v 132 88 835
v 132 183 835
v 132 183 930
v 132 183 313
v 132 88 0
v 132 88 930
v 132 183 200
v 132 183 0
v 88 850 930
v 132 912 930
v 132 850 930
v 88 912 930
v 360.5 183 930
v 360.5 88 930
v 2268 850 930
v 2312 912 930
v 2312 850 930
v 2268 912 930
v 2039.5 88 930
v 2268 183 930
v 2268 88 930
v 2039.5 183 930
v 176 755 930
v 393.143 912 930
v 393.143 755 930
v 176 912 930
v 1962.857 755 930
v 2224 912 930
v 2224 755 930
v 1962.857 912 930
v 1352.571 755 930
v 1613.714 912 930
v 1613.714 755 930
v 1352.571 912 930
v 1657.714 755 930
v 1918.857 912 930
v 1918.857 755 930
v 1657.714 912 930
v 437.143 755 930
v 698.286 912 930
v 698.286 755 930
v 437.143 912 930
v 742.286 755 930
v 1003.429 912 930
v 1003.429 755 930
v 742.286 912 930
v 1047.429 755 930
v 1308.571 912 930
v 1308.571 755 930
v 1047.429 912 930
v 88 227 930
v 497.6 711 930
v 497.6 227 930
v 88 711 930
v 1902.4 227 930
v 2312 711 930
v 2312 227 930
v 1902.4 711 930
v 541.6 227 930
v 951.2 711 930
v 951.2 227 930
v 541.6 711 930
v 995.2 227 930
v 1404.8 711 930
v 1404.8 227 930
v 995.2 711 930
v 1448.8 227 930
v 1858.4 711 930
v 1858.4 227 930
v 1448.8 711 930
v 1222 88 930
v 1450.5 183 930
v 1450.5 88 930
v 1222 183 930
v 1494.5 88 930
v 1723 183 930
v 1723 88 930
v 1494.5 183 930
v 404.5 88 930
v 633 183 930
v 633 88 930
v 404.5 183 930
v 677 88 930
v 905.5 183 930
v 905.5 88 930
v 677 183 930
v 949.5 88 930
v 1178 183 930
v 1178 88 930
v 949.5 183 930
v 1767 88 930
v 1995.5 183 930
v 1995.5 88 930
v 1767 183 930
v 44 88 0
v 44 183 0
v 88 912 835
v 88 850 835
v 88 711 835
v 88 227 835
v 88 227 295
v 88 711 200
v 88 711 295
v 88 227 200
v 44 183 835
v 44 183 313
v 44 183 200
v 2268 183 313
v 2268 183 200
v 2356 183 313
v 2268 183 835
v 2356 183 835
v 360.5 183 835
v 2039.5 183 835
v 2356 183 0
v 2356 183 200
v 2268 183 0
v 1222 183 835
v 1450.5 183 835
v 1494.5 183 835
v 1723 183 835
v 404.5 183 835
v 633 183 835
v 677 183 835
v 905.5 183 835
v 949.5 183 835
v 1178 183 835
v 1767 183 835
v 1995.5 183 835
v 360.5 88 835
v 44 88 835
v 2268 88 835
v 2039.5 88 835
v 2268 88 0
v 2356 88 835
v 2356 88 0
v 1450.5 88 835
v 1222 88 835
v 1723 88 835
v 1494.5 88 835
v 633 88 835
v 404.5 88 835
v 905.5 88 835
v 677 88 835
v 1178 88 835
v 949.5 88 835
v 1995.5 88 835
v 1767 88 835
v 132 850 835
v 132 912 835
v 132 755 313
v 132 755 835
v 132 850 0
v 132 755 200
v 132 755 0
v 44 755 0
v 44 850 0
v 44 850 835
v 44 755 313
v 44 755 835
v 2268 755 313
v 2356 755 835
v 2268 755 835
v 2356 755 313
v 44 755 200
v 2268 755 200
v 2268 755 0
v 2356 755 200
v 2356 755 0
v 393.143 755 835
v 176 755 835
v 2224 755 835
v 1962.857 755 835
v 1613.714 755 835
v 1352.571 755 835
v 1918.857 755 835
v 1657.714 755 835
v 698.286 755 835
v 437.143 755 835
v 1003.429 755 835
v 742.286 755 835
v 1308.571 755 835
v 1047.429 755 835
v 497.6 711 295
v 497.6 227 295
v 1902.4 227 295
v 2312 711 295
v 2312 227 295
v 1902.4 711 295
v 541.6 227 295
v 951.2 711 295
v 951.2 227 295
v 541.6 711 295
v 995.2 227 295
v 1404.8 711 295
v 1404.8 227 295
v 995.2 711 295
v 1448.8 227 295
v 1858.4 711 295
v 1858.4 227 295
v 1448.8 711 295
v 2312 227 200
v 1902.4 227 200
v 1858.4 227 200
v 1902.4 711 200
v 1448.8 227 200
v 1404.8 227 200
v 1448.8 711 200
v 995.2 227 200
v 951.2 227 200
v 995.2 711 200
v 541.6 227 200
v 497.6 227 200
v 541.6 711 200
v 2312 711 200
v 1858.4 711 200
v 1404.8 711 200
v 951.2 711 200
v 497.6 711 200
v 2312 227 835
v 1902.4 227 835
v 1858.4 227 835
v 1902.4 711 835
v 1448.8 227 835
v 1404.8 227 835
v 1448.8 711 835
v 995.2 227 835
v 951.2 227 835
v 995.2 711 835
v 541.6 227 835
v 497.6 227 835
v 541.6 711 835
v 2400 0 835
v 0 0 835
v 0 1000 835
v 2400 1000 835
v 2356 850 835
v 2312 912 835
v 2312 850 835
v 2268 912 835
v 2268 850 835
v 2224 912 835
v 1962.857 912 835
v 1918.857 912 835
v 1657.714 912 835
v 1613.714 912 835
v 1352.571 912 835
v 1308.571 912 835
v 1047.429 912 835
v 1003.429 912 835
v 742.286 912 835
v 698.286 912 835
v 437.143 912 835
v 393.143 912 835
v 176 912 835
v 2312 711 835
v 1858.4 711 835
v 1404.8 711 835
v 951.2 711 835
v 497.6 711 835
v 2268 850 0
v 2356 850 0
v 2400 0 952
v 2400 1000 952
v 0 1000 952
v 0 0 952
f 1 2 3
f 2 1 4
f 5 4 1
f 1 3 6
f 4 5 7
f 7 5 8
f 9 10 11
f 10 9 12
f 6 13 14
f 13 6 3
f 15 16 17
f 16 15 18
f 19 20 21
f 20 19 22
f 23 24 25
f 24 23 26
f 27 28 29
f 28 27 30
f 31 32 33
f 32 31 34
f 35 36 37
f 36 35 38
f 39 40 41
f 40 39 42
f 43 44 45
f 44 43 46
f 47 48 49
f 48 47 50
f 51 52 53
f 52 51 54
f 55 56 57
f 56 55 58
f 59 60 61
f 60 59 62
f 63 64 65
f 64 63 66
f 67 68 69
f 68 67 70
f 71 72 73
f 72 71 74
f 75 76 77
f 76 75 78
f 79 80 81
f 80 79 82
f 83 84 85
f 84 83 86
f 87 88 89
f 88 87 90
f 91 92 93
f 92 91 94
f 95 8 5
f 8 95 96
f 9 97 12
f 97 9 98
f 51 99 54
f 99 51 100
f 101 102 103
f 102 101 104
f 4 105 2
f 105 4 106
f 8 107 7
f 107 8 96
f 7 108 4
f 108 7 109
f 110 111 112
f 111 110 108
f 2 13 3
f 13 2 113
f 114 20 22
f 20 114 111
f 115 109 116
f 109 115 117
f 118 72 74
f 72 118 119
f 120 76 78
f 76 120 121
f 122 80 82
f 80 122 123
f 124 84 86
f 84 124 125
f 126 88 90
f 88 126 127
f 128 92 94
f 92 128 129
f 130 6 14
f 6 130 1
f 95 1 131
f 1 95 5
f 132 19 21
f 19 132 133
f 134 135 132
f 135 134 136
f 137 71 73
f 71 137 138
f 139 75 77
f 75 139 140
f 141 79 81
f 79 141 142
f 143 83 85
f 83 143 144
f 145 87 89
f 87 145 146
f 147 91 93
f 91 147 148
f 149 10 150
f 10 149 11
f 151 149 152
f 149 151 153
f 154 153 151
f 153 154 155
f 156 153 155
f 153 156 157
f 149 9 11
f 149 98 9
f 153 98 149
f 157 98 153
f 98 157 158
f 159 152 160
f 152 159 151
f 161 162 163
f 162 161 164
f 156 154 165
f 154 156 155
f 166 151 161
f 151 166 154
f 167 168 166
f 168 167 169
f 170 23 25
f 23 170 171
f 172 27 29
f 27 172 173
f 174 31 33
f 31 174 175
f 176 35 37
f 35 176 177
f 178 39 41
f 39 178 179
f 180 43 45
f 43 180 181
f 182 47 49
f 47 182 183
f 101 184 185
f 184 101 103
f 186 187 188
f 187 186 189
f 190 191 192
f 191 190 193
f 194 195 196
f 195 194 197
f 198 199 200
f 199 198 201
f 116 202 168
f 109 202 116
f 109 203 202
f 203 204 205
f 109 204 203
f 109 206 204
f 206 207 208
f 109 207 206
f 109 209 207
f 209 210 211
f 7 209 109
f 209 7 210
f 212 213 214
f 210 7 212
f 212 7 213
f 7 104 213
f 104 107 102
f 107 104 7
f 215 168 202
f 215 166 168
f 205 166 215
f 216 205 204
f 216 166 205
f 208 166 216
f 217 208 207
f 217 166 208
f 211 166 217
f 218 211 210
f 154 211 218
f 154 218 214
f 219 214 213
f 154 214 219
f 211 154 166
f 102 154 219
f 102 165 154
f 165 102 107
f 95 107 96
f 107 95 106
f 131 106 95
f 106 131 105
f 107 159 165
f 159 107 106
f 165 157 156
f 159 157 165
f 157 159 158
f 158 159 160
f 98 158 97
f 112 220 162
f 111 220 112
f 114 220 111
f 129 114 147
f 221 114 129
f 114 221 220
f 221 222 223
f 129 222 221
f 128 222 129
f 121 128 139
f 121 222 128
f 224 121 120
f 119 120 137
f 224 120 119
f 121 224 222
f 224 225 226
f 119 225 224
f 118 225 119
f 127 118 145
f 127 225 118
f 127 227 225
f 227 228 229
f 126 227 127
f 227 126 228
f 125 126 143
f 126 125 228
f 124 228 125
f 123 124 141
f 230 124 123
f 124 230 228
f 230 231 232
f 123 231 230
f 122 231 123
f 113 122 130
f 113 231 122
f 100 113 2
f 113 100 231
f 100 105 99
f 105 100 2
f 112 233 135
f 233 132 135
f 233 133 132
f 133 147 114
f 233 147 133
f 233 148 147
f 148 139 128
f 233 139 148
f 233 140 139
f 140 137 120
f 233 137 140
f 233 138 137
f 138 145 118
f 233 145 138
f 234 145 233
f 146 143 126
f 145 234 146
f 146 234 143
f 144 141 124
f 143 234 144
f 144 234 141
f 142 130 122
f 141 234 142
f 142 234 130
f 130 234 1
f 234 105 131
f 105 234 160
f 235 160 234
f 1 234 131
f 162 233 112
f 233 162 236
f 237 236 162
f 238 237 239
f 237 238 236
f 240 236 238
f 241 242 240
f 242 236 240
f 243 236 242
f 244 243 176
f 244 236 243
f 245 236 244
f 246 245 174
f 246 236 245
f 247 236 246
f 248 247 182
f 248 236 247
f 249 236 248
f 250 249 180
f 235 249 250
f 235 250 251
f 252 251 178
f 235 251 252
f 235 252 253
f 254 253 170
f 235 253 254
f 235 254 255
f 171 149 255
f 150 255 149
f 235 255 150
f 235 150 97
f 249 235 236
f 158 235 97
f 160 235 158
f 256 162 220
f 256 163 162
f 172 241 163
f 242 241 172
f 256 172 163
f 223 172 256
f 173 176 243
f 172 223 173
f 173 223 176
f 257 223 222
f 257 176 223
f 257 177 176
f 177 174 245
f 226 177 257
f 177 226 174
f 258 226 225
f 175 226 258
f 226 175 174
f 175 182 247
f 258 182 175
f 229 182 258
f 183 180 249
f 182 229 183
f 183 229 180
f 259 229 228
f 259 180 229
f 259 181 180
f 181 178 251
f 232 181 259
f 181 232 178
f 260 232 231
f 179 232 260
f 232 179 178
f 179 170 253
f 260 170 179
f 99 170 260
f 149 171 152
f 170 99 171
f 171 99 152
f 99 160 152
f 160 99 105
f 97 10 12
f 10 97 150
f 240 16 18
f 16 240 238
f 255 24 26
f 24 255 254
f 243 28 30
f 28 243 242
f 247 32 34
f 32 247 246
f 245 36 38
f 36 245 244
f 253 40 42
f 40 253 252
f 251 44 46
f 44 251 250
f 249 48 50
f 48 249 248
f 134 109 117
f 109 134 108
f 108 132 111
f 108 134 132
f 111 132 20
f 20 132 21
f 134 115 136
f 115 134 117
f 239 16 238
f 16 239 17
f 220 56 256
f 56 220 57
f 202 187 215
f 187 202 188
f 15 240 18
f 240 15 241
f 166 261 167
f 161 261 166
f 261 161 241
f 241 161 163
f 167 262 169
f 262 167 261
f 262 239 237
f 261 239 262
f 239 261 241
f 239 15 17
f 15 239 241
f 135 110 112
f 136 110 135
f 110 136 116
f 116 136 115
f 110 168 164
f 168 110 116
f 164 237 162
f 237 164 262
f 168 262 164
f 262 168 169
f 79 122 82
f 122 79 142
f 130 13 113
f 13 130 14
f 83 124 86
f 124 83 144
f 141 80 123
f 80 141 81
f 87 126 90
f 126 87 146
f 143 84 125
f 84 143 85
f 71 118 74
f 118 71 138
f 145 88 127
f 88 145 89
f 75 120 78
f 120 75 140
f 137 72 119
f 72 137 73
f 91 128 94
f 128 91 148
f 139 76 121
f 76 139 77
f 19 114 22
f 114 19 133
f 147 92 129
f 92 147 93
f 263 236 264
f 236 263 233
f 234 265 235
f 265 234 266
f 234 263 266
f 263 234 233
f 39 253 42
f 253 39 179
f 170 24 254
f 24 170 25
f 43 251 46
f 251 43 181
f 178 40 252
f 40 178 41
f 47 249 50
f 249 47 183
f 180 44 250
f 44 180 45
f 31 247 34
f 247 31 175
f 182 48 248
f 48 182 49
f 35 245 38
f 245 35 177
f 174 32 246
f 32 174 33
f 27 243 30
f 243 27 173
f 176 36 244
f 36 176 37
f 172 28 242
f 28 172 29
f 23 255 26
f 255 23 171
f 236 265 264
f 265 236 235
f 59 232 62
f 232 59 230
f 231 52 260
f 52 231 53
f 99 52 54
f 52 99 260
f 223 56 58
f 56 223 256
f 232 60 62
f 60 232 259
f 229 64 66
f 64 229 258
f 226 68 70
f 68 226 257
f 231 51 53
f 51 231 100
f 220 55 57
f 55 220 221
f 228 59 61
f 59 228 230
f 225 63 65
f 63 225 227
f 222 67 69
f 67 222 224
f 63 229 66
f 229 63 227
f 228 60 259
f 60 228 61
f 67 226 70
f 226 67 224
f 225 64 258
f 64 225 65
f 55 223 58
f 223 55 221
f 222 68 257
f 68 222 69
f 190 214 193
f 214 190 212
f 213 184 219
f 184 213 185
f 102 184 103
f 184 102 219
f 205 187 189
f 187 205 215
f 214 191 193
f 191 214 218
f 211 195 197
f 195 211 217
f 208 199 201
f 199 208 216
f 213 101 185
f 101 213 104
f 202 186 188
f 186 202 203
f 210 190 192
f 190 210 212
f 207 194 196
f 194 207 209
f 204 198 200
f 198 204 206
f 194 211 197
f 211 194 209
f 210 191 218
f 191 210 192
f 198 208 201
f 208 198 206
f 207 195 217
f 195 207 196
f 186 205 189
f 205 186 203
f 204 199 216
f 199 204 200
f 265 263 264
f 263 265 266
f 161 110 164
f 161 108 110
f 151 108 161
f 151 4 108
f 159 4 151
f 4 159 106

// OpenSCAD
/* [Bench Dimensions] */
benchWidth=2400;
benchDepth=1000;
// Including worksheet surface
benchHeight=952;
// Height of the lower platform, measured from the bottom, including the platform surface
braceHeight=313;
// Depth of the lower platform
braceDepth=572;

/* [Material Dimensions] */
// Thickness of the sheet used for the worksheet surfacce
topThickness=22;
// Thickness of the sheet used for the platform surface
braceTopThickness=18;

// Width of the beams used
beamWidth=44;
// Height of the beams used
beamHeight=95;

/* [Overhangs] */
// Is a front overhang desired?
frontOverhang=1; // [0,1]       
// Specify the depth of the front overhang. Minimum is 2x beamWidth. Will be rounded up to 2x beamWidth if lower is specified
frontOverhangDepth=0; 

// Is a rear overhang desired?
rearOverhang=1; // [0,1]  
// Specify the depth of the rear overhang. Minimum is 2x beamWidth. Will be rounded up to 2x beamWidth if lower is specified
rearOverhangDepth=150;    

/* [Stud Spacing] */
// Maximum distance between the small studs below the worksheet surface
smallStudSpacing=300;
// Maximum distance between the large studs below the worksheet surface
largeStudSpacing=500;
// Maximum distance between the studs below the platform surface
braceStudSpacing=500;

/* [Hidden] */
frontOverhangDepthReal = max(2*beamWidth,frontOverhangDepth)*frontOverhang;
rearOverhangDepthReal = max(2*beamWidth,rearOverhangDepth)*rearOverhang;
    
frameHeight = benchHeight - topThickness;
frameDepth = benchDepth - rearOverhangDepthReal - frontOverhangDepthReal;

braceStartX = braceHeight - beamHeight - braceTopThickness;   

///// stud orientation
hx=1*1;	// horizontal x
hy=2*1;	// horizontal y
v=3*1;	// vertical
/////


module stud(length=0, orient=v){
    echo(length=length);
	if (orient==hy) {
		cube([beamWidth,length,beamHeight]);
	} else if (orient==hx) {
		cube([length,beamWidth,beamHeight]);
	} else {
		cube([beamWidth,beamHeight,length]);
	}		
}


module leg() {
    echo("LEG");
    translate([beamWidth,0,0]) stud(frameHeight);
    translate([beamWidth,frameDepth-beamHeight,0]) stud(frameHeight);
    
    translate([0,0,braceStartX]) stud(frameDepth,orient=hy);
    
    topBeamYposStart = frontOverhang==0 ? 
        0 : 
        0-frontOverhangDepthReal+2*beamWidth;
    topBeamYposEnd = frontOverhang==0 ? 
        frameDepth : 
        frameDepth+rearOverhangDepthReal-2*beamWidth;
    translate([0,topBeamYposStart,frameHeight-beamHeight]) 
        stud(topBeamYposEnd-topBeamYposStart,orient=hy);
    
    translate([0,0,0]) stud(braceStartX);
    translate([0,frameDepth-beamHeight,0]) stud(braceStartX);
    
    translate([0,0,braceStartX+beamHeight]) stud(frameHeight-braceStartX-2*beamHeight);
    translate([0,frameDepth-beamHeight,braceStartX+beamHeight]) stud(frameHeight-braceStartX-2*beamHeight);
}

module topFrameBraces(xposStart=0, xposEnd=0, yposStart=0, yposEnd=0, studSpacing=0, bracesAtStartAndEnd=0) {
    bracesAreaWidth = xposEnd - xposStart;    
    noOfBraces = ceil(bracesAreaWidth / studSpacing)-1;
    bracesSpacing = bracesAtStartAndEnd == 0 ? 
        (bracesAreaWidth - noOfBraces * beamWidth) / (noOfBraces+1) : 
        (bracesAreaWidth - noOfBraces * beamWidth) / noOfBraces;    
    
    for(brace = [1:noOfBraces])
    {
        translate([xposStart + brace*bracesSpacing +(brace-1)*beamWidth,yposStart,0]) 
            stud(yposEnd-yposStart, orient=hy);
    }
    
    if (bracesAtStartAndEnd == 1) {
        translate([xposStart,yposStart,0]) stud(yposEnd-yposStart, orient=hy);
        translate([xposEnd-beamWidth,yposStart,0]) stud(yposEnd-yposStart, orient=hy);
    }
}

module topFrame() {
    echo("TOPFRAME");
    
    framePositionZ = frameHeight-beamHeight;
    
    // Inner beams
    translate([2*beamWidth,frontOverhangDepthReal + beamHeight,framePositionZ]) 
        stud(benchWidth-4*beamWidth, orient=hx);
    translate([2*beamWidth,frameDepth + frontOverhangDepthReal - beamWidth - beamHeight,framePositionZ]) 
        stud(benchWidth-4*beamWidth, orient=hx);
    
    // Front beam and braces
    if (frontOverhang==0){
        translate([3*beamWidth,0,framePositionZ]) 
            stud(benchWidth-6*beamWidth, orient=hx);
        
        translate([0,0,framePositionZ]) topFrameBraces(
            xposStart=3*beamWidth,
            xposEnd=benchWidth-3*beamWidth,
            yposStart=1*beamWidth,
            yposEnd=1*beamHeight,   
            studSpacing=smallStudSpacing);

    } else if (frontOverhangDepthReal==2*beamWidth) {
        translate([1*beamWidth,1*beamWidth,framePositionZ]) 
            stud(benchWidth-2*beamWidth, orient=hx);
        
        translate([0,0,framePositionZ]) 
            stud(benchWidth, orient=hx);
        
        translate([0,0,framePositionZ]) topFrameBraces(
            xposStart=3*beamWidth,
            xposEnd=benchWidth-3*beamWidth,
            yposStart=2*beamWidth,
            yposEnd=2*beamWidth+1*beamHeight,   
            studSpacing=smallStudSpacing);
        
    } else {
        translate([1*beamWidth,1*beamWidth,framePositionZ]) 
            stud(benchWidth-2*beamWidth, orient=hx);
        
        translate([0,0,framePositionZ]) 
            stud(benchWidth, orient=hx);
        
        translate([0,0,framePositionZ]) topFrameBraces(
            xposStart=3*beamWidth,
            xposEnd=benchWidth-3*beamWidth,
            yposStart=2*beamWidth,
            yposEnd=frontOverhangDepthReal+beamHeight,   
            studSpacing=smallStudSpacing,
            bracesAtStartAndEnd=1);
    }
    
    // Rear beam and braces
    if (rearOverhang==0){
        translate([3*beamWidth,benchDepth-beamWidth,framePositionZ]) 
            stud(benchWidth-6*beamWidth, orient=hx);
        
        translate([0,0,framePositionZ]) topFrameBraces(
            xposStart=3*beamWidth,
            xposEnd=benchWidth-3*beamWidth,
            yposStart=benchDepth-beamHeight,
            yposEnd=benchDepth-beamWidth,
            studSpacing=smallStudSpacing);
        
    } else if (rearOverhangDepthReal==2*beamWidth) {
        translate([1*beamWidth,benchDepth-2*beamWidth,framePositionZ]) 
            stud(benchWidth-2*beamWidth, orient=hx);
        
        translate([0,benchDepth-beamWidth,framePositionZ]) 
            stud(benchWidth, orient=hx);
        
        translate([0,0,framePositionZ]) topFrameBraces(
            xposStart=3*beamWidth,
            xposEnd=benchWidth-3*beamWidth,
            yposStart=benchDepth-beamHeight-2*beamWidth,
            yposEnd=benchDepth-2*beamWidth,   
            studSpacing=smallStudSpacing);
        
    } else {
        translate([1*beamWidth,benchDepth-2*beamWidth,framePositionZ]) 
            stud(benchWidth-2*beamWidth, orient=hx);
        
        translate([0,benchDepth-beamWidth,framePositionZ]) 
            stud(benchWidth, orient=hx);
        
        translate([0,0,framePositionZ]) topFrameBraces(
            xposStart=3*beamWidth,
            xposEnd=benchWidth-3*beamWidth,
            yposStart=benchDepth-rearOverhangDepthReal-beamHeight,
            yposEnd=benchDepth-2*beamWidth,   
            studSpacing=smallStudSpacing,
            bracesAtStartAndEnd=1);
    }
    
    // Inner braces
    translate([0,0,framePositionZ]) topFrameBraces(
        xposStart=2*beamWidth, 
        xposEnd=benchWidth-2*beamWidth, 
        yposStart=frontOverhangDepthReal + beamHeight+beamWidth, 
        yposEnd=frameDepth + frontOverhangDepthReal - beamWidth - beamHeight,
        studSpacing=largeStudSpacing);
    
    // Side braces
    ystart = frontOverhang==0 ? 0 : beamWidth;
    yend   = rearOverhang ==0 ? benchDepth : benchDepth - beamWidth;
    translate([0,ystart,framePositionZ]) stud(yend-ystart, orient=hy);
    translate([benchWidth-beamWidth,ystart,framePositionZ]) stud(yend-ystart, orient=hy);
        
    
}

module braceFrame() {
    echo("BRACEFRAME");
    framePositionZ = braceStartX;
    yposRear = frameDepth-beamHeight+frontOverhangDepthReal-beamWidth;
    yposFront = yposRear - braceDepth + beamWidth;
    
    translate([2*beamWidth,yposFront,framePositionZ])
        stud(benchWidth-4*beamWidth, orient=hx);
    
    translate([2*beamWidth,yposRear,framePositionZ])
        stud(benchWidth-4*beamWidth, orient=hx);
    
    translate([0,0,framePositionZ]) topFrameBraces(
            xposStart=2*beamWidth,
            xposEnd=benchWidth-2*beamWidth,
            yposStart=yposFront+beamWidth,
            yposEnd=yposRear,   
            studSpacing=braceStudSpacing);
}

module topDeck() {
    translate([0,0,benchHeight-topThickness])
        cube([benchWidth, benchDepth, topThickness]);
    
}

module braceDeck() {
    yposRear = frameDepth-beamHeight+frontOverhangDepthReal;
    yposFront = yposRear - braceDepth;
    
    braceDeckWidth = benchWidth-2*beamWidth;
    braceDeckDepth = yposRear-yposFront;
    
    echo(braceDeckWidth=braceDeckWidth);  
    echo(braceDeckDepth=braceDeckDepth);  
    
    translate([beamWidth,yposFront,braceHeight-braceTopThickness])
        cube([braceDeckWidth, braceDeckDepth, braceTopThickness]);
}


module bench() {
    translate([beamWidth,frontOverhangDepthReal,0]) leg();
    translate([benchWidth-beamWidth,frontOverhangDepthReal,0]) mirror([1,0,0]) leg();
    topFrame();
    braceFrame();
    topDeck();
    braceDeck();    
}

bench();
